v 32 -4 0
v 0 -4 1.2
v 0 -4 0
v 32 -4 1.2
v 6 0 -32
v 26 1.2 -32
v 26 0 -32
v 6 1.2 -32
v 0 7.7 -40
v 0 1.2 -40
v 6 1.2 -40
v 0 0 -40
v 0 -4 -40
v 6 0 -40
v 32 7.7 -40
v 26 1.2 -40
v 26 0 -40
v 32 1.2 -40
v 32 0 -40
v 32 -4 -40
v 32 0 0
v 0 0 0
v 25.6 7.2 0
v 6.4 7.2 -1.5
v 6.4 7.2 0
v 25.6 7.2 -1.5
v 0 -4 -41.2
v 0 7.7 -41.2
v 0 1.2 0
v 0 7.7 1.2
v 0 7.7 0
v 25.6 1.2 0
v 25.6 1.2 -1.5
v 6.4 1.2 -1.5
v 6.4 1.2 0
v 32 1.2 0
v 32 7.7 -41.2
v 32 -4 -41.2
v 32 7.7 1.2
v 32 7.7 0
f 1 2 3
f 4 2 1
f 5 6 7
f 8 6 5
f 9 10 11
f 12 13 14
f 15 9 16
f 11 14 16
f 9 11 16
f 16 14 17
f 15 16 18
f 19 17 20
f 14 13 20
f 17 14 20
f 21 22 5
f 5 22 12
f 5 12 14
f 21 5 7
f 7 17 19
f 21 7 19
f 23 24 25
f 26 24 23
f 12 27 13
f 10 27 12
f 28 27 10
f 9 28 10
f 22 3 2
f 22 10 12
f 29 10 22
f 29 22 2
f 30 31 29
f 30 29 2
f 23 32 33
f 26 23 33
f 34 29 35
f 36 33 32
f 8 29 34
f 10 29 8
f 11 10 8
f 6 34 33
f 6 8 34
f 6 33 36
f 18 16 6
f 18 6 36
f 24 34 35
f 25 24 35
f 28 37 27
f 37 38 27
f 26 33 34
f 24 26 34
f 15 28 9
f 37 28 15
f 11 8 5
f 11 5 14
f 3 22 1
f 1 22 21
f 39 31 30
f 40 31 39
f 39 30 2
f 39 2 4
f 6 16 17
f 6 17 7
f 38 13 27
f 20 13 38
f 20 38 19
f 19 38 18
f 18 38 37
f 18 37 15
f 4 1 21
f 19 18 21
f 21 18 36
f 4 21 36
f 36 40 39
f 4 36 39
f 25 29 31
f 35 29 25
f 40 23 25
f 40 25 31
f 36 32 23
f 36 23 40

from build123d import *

# Parameters (mm, degrees)
EXTRUDE_309_DEPTH      = 1.2
SKETCH_2_W             = 32
SKETCH_2_H             = 1.2
PCB_DEPTH              = 6.5
PCB_2_DEPTH            = 6
CUT_EXTRUDE_1014_REACH = 54.571
SKETCH_5_W             = 32
SKETCH_5_H             = 1.2
EXTRUDE_1286_DEPTH     = 4


with BuildPart() as part:
    # 草图1 → Extrude 309 (new body)
    with BuildSketch(Plane(origin=(0, 0, 0), x_dir=(1, 0, 0), z_dir=(0, 1, 0))):
        Polygon((32, 0), (32, 40), (32, 41.2), (0, 41.2), (0, 40), (0, 0), (0, -1.2), (32, -1.2), align=None)
    extrude(amount=EXTRUDE_309_DEPTH)

    # 草图2 → PCB (add)
    with BuildSketch(Plane(origin=(0, 1.2, 0), x_dir=(1, 0, 0), z_dir=(0, 1, 0))):
        with Locations((16, -0.6)):
            Rectangle(SKETCH_2_W, SKETCH_2_H)
        with Locations((16, 40.6)):
            Rectangle(SKETCH_2_W, SKETCH_2_H)
    extrude(amount=PCB_DEPTH)

    # 草图3 → PCB 2 (add)
    with BuildSketch(Plane(origin=(0, 1.2, 0), x_dir=(1, 0, 0), z_dir=(0, 1, 0))):
        Polygon((16, 0), (25.6, 0), (25.6, 1.5), (6.4, 1.5), (6.4, 0), align=None)
    extrude(amount=PCB_2_DEPTH)

    # 草图4 → Cut-Extrude 1014 (cut, up to next)
    with BuildSketch(Plane(origin=(0, 1.2, 0), x_dir=(1, 0, 0), z_dir=(0, 1, 0)), mode=Mode.PRIVATE) as cut_extrude_1014_sk1:
        Polygon((16, 40), (26, 40), (26, 32), (6, 32), (6, 40), align=None)
    cut_extrude_1014_tool1 = extrude(cut_extrude_1014_sk1.sketch, amount=-CUT_EXTRUDE_1014_REACH, mode=Mode.PRIVATE) & part.part
    add(cut_extrude_1014_tool1.solids().sort_by_distance((16, 1.2, -36))[0], mode=Mode.SUBTRACT)

    # 草图5 → Extrude 1286 (add)
    with BuildSketch(Plane.XZ):
        with Locations((16, 0.6)):
            Rectangle(SKETCH_5_W, SKETCH_5_H)
        with Locations((16, -40.6)):
            Rectangle(SKETCH_5_W, SKETCH_5_H)
    extrude(amount=EXTRUDE_1286_DEPTH)


solid = part.part
